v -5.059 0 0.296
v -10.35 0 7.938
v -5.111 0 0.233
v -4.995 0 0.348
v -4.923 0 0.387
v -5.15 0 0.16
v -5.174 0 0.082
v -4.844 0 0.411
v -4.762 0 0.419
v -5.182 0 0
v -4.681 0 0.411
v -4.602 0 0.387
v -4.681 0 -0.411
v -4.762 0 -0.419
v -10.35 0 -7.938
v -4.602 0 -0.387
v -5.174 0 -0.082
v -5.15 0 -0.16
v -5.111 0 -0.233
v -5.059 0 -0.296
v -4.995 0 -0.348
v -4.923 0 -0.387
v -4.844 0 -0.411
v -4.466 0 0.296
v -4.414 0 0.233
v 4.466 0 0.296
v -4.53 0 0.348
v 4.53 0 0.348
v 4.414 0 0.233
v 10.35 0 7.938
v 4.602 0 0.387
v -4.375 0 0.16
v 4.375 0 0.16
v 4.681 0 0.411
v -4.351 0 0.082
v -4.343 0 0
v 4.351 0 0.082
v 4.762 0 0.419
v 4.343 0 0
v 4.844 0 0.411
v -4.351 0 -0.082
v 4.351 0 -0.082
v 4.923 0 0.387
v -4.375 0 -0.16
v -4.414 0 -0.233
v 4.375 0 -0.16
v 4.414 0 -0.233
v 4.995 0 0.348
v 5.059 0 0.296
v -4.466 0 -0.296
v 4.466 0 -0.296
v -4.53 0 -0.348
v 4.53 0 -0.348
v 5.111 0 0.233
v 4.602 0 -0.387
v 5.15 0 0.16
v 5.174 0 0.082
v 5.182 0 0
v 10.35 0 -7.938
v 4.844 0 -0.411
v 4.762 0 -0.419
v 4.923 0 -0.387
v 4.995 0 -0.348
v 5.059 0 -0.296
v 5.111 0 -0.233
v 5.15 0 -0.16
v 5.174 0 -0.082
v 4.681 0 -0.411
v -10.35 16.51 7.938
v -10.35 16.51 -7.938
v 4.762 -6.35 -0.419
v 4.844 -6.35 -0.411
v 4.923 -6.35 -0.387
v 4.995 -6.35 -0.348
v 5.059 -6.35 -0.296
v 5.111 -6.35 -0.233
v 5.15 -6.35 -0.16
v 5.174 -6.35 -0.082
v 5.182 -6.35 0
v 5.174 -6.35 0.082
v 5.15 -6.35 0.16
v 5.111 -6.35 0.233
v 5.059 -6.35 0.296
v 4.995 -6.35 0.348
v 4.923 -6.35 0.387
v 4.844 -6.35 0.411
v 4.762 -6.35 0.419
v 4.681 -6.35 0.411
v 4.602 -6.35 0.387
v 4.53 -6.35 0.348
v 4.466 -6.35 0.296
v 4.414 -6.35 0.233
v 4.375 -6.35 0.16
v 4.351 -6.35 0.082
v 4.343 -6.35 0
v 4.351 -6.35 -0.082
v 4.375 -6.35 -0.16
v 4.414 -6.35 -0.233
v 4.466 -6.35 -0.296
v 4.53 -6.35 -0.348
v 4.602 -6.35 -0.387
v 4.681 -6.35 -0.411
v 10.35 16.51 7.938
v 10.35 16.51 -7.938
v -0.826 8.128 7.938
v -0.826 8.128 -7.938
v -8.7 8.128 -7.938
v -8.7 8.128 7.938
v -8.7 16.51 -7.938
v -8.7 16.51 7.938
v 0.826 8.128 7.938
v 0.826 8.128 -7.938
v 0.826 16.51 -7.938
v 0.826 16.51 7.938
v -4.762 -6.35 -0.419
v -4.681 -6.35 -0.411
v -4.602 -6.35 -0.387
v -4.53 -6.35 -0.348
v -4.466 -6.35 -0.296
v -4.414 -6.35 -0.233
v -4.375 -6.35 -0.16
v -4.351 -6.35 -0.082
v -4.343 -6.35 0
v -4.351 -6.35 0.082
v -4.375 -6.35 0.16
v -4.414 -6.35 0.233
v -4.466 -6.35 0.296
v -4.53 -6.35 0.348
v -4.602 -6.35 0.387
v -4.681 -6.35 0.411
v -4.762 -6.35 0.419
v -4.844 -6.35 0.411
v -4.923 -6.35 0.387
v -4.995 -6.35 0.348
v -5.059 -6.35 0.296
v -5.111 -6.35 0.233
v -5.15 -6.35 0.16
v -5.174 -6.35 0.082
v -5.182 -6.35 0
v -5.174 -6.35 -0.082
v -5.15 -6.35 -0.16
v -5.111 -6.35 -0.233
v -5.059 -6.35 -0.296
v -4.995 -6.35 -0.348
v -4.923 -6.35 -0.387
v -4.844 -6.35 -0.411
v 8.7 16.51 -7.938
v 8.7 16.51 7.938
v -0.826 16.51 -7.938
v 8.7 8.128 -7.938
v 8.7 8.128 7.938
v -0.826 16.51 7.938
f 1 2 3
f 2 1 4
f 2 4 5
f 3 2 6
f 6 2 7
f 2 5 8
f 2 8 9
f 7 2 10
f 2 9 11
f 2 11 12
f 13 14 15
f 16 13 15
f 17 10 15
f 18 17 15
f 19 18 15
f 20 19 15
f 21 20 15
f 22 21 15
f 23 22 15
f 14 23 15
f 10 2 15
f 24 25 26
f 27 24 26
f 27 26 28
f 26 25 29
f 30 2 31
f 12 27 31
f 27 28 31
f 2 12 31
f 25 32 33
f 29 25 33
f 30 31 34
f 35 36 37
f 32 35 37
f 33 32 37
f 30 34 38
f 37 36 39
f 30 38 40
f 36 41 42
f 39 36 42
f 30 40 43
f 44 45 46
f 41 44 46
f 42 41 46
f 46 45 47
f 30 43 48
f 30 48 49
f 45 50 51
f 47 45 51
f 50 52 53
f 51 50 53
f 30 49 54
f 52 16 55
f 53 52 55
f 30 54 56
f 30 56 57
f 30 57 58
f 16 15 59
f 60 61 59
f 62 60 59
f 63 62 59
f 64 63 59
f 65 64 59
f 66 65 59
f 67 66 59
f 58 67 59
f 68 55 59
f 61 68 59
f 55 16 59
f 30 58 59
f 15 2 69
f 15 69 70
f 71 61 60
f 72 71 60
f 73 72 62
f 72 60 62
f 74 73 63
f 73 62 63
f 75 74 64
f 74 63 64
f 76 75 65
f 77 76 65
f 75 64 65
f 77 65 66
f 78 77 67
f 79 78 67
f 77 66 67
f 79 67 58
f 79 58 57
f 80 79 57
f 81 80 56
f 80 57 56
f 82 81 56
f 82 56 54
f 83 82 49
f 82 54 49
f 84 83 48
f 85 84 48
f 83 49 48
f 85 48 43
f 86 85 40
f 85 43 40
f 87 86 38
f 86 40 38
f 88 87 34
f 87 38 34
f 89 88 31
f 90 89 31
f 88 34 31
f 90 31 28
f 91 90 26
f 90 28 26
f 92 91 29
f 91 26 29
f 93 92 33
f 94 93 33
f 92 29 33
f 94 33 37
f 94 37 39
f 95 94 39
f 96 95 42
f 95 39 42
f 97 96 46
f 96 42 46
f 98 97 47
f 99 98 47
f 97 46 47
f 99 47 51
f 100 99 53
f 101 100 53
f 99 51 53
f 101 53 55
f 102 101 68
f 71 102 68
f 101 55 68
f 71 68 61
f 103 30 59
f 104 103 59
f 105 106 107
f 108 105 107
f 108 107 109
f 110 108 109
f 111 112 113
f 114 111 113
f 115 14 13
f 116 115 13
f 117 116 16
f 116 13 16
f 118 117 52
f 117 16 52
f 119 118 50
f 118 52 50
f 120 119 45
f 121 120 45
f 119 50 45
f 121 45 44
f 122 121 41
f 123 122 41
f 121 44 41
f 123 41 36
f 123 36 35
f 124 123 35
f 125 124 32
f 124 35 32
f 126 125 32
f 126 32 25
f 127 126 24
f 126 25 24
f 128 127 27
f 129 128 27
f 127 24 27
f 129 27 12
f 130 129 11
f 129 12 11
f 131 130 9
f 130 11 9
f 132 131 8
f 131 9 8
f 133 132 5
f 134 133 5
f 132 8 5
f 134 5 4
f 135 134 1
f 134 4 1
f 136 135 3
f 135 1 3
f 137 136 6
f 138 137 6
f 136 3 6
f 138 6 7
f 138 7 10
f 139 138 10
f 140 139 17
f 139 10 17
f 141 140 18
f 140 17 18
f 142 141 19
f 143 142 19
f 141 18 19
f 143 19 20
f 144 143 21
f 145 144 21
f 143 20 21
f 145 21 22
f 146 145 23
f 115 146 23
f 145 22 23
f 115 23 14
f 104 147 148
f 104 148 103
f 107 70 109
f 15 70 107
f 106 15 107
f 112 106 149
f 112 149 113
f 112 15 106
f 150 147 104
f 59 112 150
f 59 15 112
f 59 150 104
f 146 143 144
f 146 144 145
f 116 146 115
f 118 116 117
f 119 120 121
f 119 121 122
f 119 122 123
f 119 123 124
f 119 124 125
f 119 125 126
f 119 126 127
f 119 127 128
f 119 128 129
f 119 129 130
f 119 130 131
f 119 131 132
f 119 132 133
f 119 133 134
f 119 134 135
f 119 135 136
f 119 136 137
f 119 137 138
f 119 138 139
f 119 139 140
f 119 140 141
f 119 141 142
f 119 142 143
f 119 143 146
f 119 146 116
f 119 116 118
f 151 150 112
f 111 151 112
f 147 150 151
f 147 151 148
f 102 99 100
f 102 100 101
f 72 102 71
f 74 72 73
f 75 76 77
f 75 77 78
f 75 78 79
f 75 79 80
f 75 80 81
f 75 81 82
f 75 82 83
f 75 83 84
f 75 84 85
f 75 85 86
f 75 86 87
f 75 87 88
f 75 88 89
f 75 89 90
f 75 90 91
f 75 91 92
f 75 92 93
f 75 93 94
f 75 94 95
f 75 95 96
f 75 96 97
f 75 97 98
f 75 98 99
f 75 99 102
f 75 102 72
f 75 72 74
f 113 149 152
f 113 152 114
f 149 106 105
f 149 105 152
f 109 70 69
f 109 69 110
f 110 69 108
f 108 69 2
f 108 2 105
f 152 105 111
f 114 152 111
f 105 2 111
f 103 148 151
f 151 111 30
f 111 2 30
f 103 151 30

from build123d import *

# Parameters (mm, degrees)
SKETCH1_W           = 20.701
SKETCH1_H           = 15.875
BOSS_EXTRUDE1_DEPTH = 16.51
SKETCH2_R           = 0.4191
BOSS_EXTRUDE2_DEPTH = 6.35
SKETCH3_W           = 7.874
SKETCH3_H           = 8.382
CUT_EXTRUDE1_DEPTH  = 26.134211252


with BuildPart() as part:
    # Sketch1 → Boss-Extrude1 (new body)
    with BuildSketch(Plane(origin=(0, 0, 0), x_dir=(1, 0, 0), z_dir=(0, 1, 0))):
        Rectangle(SKETCH1_W, SKETCH1_H)
    extrude(amount=BOSS_EXTRUDE1_DEPTH)

    # Sketch2 → Boss-Extrude2 (add)
    with BuildSketch(Plane(origin=(0, 0, 0), x_dir=(-1, 0, 0), z_dir=(0, -1, 0))):
        with Locations((4.7625, 0)):
            Circle(SKETCH2_R)
        with Locations((-4.7625, 0)):
            Circle(SKETCH2_R)
    extrude(amount=BOSS_EXTRUDE2_DEPTH)

    # Sketch3 → Cut-Extrude1 (cut, through all)
    with BuildSketch(Plane(origin=(0, 0, -7.9375), x_dir=(-1, 0, 0), z_dir=(0, 0, -1))):
        with Locations((-4.7625, 12.319)):
            Rectangle(SKETCH3_W, SKETCH3_H)
        with Locations((4.7625, 12.319)):
            Rectangle(SKETCH3_W, SKETCH3_H)
    extrude(amount=-CUT_EXTRUDE1_DEPTH, mode=Mode.SUBTRACT)


solid = part.part
